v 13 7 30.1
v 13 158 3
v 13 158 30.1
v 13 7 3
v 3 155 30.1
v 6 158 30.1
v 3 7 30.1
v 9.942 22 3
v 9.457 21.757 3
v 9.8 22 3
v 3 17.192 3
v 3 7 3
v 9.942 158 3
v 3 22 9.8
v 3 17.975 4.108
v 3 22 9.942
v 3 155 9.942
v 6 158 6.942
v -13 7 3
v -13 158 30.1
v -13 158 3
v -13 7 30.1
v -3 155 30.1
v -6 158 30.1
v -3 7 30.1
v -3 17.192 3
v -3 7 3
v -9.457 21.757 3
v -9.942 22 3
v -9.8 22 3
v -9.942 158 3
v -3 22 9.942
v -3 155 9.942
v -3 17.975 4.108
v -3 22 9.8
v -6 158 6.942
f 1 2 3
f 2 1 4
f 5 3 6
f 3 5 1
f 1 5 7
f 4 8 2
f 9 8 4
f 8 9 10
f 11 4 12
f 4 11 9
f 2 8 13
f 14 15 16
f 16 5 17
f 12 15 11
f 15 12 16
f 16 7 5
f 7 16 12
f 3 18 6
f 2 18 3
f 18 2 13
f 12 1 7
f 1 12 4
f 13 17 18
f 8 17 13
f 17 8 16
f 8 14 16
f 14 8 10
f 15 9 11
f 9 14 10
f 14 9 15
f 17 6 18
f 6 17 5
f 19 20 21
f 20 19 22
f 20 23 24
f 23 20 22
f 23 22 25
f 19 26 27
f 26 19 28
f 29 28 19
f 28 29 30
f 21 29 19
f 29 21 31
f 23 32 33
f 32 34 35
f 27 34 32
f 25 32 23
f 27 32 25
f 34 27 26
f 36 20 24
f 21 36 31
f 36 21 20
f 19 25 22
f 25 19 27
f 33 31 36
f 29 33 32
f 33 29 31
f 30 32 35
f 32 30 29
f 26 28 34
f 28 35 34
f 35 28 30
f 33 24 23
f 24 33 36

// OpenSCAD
module inner_side_cutout(inner_box_offset_y, inner_box_offset_z, box_inner_w, box_w, h, inner_h) {
  difference() {
    translate([3, inner_box_offset_y, inner_box_offset_z]) cube([10, box_inner_w, inner_h+0.1]);
    translate([-1.2-3,inner_box_offset_y+15,3]) rotate([0,45,0]) cube([10, box_w, 10]);
    translate([-7.2, 22, 0])  rotate([45,45,0]) cube([10,10,10]);
    translate([0,box_inner_w+1, 0]) rotate([0,0,45]) cube([10, 10, h+1]);
  }
}


is_top=true;
box_h_top = 30;
box_h_bottom = 30;
box_h = box_h_top + box_h_bottom;
box_l = 235;
box_w = 165;

h = is_top ? box_h_top : box_h_bottom;

box_inner_h_top = 27;
box_inner_h_bottom = 27;
box_inner_h = box_inner_h_top+box_inner_h_bottom;
box_inner_l = 214;
box_inner_w = 151;

inner_h = is_top ? box_inner_h_top : box_inner_h_bottom;

inner_box_offset_x = (box_l-box_inner_l)/2;
inner_box_offset_y = (box_w-box_inner_w)/2;
inner_box_offset_z_top = (box_h_top-box_inner_h_top);
inner_box_offset_z_bottom = (box_h_bottom-box_inner_h_bottom);

inner_box_offset_z = is_top ? inner_box_offset_z_top : inner_box_offset_z_bottom;


//translate([box_l,0,0])
mirror([1,0,0])
inner_side_cutout(inner_box_offset_y, inner_box_offset_z, box_inner_w, box_w, h, inner_h);
inner_side_cutout(inner_box_offset_y, inner_box_offset_z, box_inner_w, box_w, h, inner_h);
